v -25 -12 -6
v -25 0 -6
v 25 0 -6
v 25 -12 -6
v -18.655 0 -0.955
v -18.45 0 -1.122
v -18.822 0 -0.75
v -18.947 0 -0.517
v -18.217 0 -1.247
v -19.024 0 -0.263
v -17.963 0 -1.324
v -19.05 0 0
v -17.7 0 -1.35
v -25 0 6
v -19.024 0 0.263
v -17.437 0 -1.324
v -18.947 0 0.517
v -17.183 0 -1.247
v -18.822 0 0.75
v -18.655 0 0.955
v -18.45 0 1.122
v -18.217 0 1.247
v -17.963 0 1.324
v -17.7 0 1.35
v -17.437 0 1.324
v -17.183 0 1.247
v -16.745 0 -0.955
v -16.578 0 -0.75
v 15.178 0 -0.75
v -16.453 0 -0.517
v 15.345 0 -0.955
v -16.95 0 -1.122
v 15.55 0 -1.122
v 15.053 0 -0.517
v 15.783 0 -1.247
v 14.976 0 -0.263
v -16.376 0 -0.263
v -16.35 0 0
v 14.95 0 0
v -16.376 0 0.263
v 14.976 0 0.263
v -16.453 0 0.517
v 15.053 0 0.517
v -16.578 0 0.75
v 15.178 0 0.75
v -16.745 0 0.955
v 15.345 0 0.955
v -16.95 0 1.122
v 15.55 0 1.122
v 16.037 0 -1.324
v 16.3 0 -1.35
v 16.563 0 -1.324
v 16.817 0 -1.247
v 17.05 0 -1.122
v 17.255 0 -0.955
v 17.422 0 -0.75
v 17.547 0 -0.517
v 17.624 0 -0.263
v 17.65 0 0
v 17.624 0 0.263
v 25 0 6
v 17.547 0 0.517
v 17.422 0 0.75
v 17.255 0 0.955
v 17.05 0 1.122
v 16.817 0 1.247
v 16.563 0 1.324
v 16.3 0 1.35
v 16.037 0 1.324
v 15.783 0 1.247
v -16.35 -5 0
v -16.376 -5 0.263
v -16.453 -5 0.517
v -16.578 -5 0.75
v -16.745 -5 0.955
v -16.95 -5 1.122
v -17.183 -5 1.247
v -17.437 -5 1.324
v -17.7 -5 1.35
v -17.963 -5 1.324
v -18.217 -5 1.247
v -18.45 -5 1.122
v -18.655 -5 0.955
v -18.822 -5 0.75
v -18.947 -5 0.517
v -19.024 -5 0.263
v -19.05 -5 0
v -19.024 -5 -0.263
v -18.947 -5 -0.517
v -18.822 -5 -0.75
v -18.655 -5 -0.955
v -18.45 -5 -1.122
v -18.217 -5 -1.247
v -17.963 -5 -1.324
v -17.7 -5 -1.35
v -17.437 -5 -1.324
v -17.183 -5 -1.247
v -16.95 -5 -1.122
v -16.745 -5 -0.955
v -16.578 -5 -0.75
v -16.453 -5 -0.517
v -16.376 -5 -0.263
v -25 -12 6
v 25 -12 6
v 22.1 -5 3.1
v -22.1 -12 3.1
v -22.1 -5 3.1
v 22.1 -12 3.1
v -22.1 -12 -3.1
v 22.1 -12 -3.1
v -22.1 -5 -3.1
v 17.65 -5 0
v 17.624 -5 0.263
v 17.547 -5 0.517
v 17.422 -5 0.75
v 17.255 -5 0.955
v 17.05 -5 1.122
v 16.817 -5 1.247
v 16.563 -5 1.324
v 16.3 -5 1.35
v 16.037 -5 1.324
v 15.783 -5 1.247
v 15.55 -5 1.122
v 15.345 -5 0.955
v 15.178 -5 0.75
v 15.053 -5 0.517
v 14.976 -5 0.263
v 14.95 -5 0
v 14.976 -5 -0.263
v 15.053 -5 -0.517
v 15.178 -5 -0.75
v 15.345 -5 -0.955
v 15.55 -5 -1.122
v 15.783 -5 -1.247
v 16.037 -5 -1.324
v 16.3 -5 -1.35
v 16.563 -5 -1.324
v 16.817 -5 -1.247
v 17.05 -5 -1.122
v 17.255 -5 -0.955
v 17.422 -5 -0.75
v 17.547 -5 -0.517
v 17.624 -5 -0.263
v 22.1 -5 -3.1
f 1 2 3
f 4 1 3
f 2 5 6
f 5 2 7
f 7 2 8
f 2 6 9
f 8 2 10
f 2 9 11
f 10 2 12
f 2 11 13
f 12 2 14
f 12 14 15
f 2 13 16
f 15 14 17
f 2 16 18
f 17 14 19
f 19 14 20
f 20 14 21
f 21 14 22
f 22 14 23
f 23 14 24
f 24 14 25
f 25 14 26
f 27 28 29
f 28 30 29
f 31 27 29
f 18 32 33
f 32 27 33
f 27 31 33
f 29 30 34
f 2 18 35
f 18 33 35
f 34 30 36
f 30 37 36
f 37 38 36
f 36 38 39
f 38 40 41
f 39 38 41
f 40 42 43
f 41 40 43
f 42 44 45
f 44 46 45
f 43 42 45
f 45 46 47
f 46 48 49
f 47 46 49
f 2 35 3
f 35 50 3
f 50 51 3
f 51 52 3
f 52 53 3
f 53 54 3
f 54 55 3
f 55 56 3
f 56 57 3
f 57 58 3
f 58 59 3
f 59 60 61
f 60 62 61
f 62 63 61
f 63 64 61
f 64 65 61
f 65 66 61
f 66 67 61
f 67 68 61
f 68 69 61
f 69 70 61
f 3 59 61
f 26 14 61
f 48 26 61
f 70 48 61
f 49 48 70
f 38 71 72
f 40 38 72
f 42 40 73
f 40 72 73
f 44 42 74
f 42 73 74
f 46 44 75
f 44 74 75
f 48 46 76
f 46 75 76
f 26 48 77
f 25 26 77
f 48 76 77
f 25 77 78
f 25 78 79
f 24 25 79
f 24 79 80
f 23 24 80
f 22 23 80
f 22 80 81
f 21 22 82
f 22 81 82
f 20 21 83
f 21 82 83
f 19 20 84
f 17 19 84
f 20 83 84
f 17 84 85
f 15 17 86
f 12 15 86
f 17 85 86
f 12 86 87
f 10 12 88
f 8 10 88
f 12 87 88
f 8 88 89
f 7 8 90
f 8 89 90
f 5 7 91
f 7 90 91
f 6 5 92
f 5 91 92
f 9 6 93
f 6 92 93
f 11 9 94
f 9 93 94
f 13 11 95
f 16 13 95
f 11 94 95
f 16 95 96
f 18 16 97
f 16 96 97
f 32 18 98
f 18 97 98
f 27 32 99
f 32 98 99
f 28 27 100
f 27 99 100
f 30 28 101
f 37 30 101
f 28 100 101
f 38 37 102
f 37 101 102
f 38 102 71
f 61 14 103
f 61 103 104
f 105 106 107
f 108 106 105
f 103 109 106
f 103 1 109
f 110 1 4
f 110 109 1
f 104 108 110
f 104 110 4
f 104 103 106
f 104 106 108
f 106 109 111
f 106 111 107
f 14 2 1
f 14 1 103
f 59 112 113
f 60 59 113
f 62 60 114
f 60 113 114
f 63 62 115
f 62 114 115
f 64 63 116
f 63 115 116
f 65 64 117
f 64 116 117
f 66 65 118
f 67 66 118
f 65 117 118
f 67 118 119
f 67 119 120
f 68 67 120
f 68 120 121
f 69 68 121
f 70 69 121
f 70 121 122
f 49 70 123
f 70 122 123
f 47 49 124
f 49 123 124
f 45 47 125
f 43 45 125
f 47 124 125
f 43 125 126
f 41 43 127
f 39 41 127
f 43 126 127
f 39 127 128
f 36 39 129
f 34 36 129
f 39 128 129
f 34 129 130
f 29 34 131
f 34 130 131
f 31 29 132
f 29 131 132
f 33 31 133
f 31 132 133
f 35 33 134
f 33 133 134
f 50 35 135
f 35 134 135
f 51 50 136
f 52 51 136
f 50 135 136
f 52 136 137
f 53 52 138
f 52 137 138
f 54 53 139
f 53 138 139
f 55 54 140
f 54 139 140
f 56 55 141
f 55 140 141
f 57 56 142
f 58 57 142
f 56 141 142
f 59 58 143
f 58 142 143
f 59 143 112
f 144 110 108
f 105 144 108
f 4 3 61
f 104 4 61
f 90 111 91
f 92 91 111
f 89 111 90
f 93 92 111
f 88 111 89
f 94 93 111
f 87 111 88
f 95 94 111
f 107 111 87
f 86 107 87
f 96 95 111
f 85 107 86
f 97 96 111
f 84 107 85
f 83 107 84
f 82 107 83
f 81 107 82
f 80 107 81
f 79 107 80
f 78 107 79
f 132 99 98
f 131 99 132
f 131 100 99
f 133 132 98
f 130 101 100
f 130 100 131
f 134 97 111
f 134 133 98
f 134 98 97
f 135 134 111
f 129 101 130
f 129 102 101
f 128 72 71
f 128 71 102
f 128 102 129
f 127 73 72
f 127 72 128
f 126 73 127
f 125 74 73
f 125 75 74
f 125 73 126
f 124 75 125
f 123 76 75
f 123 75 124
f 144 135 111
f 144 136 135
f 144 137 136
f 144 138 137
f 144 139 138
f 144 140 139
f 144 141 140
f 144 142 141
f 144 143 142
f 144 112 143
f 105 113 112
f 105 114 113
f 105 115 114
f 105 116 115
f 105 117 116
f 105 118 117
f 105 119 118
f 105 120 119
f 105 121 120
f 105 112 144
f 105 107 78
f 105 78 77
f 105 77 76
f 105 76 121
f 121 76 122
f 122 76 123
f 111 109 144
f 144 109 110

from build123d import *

# Parameters (mm, degrees)
F0_W     = 50
F0_H     = 12
F1_DEPTH = 12
F2_W     = 44.2
F2_H     = 6.2
F3_DEPTH = 7
F4_R     = 1.35
F5_DEPTH = 5


with BuildPart() as f1:
    # F0 (on Front) → F1 (new body)
    with BuildSketch(Plane.XZ):
        Rectangle(F0_W, F0_H)
    extrude(amount=F1_DEPTH)

    # F2 (on face) → F3 (cut)
    with BuildSketch(Plane.XZ.offset(12)):
        Rectangle(F2_W, F2_H)
    extrude(amount=-F3_DEPTH, mode=Mode.SUBTRACT)

    # F4 (on face) → F5 (cut, through all)
    with BuildSketch(Plane.XZ.offset(5)):
        with Locations((-17.7, 0)):
            Circle(F4_R)
        with Locations((16.3, 0)):
            Circle(F4_R)
    extrude(amount=-F5_DEPTH, mode=Mode.SUBTRACT)


solid = f1.part
